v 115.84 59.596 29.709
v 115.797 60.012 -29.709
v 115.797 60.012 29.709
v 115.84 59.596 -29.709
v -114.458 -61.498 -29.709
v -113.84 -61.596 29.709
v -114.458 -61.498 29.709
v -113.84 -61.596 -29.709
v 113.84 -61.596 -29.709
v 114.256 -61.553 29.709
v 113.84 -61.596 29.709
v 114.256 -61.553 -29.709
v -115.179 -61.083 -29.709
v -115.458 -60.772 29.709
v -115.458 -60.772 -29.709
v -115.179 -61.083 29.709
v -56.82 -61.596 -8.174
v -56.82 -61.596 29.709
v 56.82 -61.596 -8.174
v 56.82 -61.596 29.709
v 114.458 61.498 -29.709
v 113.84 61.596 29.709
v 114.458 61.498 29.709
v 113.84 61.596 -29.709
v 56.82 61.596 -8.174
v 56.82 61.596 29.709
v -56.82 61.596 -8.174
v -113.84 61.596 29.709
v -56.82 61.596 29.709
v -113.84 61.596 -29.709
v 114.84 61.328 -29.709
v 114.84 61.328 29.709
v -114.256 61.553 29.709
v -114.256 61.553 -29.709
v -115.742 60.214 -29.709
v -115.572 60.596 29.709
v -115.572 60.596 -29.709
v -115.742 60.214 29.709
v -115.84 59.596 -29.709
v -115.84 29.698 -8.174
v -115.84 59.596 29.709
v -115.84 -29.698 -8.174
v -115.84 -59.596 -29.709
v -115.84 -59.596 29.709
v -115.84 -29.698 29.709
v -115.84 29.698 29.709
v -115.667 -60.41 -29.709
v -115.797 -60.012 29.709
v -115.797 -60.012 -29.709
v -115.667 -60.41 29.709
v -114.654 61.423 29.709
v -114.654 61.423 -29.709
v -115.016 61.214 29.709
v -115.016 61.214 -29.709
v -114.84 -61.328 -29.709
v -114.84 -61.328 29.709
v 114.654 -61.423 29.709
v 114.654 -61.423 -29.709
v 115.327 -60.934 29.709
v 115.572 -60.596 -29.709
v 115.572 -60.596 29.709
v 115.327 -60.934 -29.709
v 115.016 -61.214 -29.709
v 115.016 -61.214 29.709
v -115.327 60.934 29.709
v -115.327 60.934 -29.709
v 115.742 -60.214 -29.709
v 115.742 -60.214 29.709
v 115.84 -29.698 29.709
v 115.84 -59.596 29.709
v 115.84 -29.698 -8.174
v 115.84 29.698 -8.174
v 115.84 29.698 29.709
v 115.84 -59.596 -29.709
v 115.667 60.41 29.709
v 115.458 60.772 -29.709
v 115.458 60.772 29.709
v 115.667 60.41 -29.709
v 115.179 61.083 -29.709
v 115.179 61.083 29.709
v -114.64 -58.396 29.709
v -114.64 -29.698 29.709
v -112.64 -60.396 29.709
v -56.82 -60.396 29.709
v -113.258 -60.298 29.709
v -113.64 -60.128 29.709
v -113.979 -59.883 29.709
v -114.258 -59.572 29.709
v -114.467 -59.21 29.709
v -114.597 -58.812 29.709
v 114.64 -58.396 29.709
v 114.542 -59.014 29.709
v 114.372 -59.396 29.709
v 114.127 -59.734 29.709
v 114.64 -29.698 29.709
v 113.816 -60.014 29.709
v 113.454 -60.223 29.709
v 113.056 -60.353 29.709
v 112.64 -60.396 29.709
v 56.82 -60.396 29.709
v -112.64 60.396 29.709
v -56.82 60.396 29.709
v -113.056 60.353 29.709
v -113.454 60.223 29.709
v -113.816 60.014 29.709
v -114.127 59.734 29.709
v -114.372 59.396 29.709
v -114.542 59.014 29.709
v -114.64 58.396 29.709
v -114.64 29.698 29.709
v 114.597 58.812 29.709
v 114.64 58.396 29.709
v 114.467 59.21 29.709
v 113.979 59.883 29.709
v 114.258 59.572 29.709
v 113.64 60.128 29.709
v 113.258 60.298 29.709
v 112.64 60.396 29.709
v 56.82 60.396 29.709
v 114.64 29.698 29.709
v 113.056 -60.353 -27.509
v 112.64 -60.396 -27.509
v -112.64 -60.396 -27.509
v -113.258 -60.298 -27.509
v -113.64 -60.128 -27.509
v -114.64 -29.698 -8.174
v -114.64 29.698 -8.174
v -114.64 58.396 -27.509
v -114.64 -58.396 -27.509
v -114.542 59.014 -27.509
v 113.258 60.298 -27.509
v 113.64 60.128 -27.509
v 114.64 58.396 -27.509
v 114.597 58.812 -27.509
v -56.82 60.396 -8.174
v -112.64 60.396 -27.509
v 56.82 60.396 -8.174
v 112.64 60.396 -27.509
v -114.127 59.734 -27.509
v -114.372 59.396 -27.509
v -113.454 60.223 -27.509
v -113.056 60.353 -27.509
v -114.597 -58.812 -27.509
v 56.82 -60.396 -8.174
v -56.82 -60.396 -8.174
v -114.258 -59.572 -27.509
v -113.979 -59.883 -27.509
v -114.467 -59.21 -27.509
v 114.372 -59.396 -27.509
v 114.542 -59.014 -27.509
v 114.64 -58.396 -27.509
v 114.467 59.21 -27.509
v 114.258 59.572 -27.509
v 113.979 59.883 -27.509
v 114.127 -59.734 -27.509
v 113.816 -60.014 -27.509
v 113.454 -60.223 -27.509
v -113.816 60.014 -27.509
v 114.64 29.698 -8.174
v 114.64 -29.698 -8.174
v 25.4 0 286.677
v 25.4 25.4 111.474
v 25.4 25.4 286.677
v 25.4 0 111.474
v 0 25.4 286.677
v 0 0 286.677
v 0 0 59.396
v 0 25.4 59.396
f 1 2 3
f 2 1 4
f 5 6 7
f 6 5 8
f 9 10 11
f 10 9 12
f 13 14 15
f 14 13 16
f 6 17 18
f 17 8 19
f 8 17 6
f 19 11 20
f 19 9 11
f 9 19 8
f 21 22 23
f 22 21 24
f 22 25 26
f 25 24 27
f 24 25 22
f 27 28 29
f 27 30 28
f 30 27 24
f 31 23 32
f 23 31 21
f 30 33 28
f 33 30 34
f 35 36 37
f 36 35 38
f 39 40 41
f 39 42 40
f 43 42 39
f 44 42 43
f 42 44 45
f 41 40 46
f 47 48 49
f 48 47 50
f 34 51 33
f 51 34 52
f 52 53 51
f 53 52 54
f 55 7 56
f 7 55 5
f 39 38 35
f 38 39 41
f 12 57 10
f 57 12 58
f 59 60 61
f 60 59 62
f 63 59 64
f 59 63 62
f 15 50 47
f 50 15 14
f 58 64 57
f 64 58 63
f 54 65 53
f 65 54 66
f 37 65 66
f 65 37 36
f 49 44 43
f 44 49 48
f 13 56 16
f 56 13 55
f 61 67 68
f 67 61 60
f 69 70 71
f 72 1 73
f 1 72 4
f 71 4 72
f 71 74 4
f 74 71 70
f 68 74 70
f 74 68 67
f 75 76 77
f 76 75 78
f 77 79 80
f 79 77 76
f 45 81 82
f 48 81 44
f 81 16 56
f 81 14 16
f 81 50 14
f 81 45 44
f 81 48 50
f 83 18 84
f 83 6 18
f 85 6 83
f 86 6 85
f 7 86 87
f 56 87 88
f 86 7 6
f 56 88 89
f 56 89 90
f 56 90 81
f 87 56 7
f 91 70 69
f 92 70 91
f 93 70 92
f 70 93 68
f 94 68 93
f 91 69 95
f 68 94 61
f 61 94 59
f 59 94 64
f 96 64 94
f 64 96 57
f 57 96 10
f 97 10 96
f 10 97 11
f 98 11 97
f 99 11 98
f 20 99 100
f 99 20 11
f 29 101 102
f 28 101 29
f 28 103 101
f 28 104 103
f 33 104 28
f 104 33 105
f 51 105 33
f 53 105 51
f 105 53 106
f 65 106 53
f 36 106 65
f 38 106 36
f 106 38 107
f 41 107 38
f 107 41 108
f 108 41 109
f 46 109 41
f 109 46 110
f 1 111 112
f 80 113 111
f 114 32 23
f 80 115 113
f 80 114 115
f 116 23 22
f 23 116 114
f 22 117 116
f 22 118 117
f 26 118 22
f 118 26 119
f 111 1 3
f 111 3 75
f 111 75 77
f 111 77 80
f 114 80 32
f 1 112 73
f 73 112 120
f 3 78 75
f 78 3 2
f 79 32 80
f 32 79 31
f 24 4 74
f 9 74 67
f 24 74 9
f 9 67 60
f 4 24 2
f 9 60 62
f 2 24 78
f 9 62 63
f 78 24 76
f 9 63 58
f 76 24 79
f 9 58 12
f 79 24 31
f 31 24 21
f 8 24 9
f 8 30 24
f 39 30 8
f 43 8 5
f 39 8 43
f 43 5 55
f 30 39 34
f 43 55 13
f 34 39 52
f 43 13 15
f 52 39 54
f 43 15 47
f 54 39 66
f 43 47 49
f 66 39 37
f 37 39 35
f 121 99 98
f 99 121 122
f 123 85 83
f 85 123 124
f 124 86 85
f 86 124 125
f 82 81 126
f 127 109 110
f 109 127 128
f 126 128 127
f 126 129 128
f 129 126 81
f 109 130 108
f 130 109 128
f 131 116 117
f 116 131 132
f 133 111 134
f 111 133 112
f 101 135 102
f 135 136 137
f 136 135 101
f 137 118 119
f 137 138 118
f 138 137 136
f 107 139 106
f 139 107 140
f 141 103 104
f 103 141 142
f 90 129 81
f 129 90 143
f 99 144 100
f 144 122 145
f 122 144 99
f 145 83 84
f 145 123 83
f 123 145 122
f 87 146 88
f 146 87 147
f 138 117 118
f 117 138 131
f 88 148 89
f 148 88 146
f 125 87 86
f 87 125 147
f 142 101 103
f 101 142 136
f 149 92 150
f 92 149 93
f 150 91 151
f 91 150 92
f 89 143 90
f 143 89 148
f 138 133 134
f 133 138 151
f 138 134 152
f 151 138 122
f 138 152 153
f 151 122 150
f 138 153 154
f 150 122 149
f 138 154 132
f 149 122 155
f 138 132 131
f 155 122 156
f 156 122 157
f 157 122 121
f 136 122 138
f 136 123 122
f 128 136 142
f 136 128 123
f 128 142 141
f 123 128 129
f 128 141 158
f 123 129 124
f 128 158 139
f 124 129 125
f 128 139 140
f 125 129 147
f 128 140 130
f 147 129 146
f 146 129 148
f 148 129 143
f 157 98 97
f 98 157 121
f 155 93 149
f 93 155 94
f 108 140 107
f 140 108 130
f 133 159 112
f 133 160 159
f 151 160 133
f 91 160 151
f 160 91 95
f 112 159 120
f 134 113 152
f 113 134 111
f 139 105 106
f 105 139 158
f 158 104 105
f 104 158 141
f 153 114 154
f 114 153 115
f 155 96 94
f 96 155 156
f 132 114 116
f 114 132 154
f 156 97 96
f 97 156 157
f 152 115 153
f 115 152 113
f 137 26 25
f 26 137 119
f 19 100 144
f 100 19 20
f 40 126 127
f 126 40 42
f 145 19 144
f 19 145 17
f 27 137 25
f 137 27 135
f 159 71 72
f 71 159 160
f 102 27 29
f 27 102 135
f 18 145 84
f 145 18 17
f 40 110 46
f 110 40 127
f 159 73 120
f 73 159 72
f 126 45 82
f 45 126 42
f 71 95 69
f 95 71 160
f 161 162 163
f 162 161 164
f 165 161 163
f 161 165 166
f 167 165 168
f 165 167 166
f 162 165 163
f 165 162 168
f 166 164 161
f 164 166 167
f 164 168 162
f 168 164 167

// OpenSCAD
// file: myTools.scad
module tube (r = 0, d = 0, l = 0, 
            thick = 0, 
            bCentered = true, 
            taper_pct = 0, 
            circlip = false) // r=radius d=dia l=length 
{
    assert( r != 0 || d != 0, "specify one of radius or diameter");
    assert( l != 0 , "tube: need length 'l' to be non zero");
    assert( thick != 0, "wall thickness cannot be zero");

    punch = $preview ? .2 : 0; // stop funny view artifact

    dia = r ? r * 2 : d;

    od = ((thick > 0) ? dia + thick * 2 : dia);
    id = (thick > 0) ? dia             : dia  + thick *2; 

    
    
    if (thick > 0)
        echo ("tube\tMIN id = ", id, "od = ", od, "wall = ", thick, "center= ", bCentered);
    else
        echo ("tube\tMAX od = ", od, "id = ", id, "wall = ", thick, "center= ", bCentered);

    echo ("tube\tHeigth = ", l);
        
    if (taper_pct != 0)
    {
        echo ("tube\t*** OD expanded by ", taper_pct, "%, : bottom od = ", od * (1. +taper_pct/100), "top od = ", od);
    }
    
    assert(dia || dia < 0, "tube : missing r or d ");
    
    // if taper_pct specified, the base will always be closest to 0,0,0
    translate([ 0, 0, taper_pct == 0 ? 0: bCentered ? l/2:l  ])
    rotate([0, taper_pct == 0 ? 0 : 180, 0 ])

    difference()
    {
        // make a reese's cup
        {
            color("YELLOW", .3)
            linear_extrude(height= l, scale = 1 + taper_pct/100)
                difference()
                {
                    circle(d = od);
                    circle(d = .5);
                }
        }
    
     // hollow out reessed cup
     color("GREEN")
     translate([0, 0, -punch/2])
     linear_extrude(height= l+ punch*2, $fn=100)
     {
        circle(d = id);
        if (circlip) #square([1 + punch, od ]);
     }
    
    }
}
//==============================================================================
        
module abox (dims, 
            thick = 0, 
            bCentered = true, 
            round_out = 0, 
            round_in = 0, 
            bSolid = false,
            bHollow = false,
            elevator = 0)   // move bottom up by X
{
    punch = $preview ? .1 : 0; // stop funny view artifact
    
    assert(thick != 0, "Thick must be specified. +=outside dim, -= inside dims");
    assert(dims.z > thick, "wall thickness too large for depth of box");

    wall2 = abs(thick) * 2; // 2 walls in each direction
    wall = wall2 / 2;
    
    // box either grows inward (thick < 0) or outward (thick > 0)  from dims
    fat = dims + [ wall2, wall2, wall];
    thin = dims - [ wall2, wall2, wall];
    
    offset = (thick > 0 && bCentered == false) ? wall : 0;
    
    //echo ("abox : adjusting x,y,z by ", offset, " to move origin from  center to 0,0,0");
    translate( [ bCentered ? 0 : dims.x /2 + offset, bCentered ? 0 : dims.y /2 + offset, bCentered ? 0 : dims.z /2 + offset/2]) 
    {
        if (thick > 0)
        {   
            // wall grows outwards from users dim
            echo ("making a box, MAX INSIDE dim = ", dims, "a wall=", thick, "mm ... max outside = ", fat, " mm");
        }
        else
        {
            // wall grows inward from users dime
            echo ("making a box, MAX OUTSIDE dim = ", dims, "a wall=", thick, "mm ... min inside = ", thin, " mm");
        }
        
        // linear extrude alway works in the positive x/y plane an goes upward.
        // after calc, re-center about 0,0,0 where a bCentered cube would be
        
        translate([ 0, 0, thick > 0  ? -fat.z/2 : -dims.z/2 ])
        difference()
        {
            echo ("round_out = ", round_out);

            // MAKE SOLID BOX --------------------------------------
            router_outside = round_out ? round_out : 0;
            x = thick > 0  ? fat.x - router_outside : dims.x - router_outside;
            y = thick > 0  ? fat.y - router_outside : dims.y - router_outside;


            // MAKE PUCHNED INSIDE
            // using 'offset' it will add r on all dimensions, then round., 
            // so now you have fatter perimeter than you started with :(
            //  but at least the corners are round.
            
            // Compensate by shrinking dimension by r, 
            // and then by calling offset, offset will then add it back

            color("YELLOW", .2)

            linear_extrude(thick > 0  ? fat.z : dims.z)
            if (round_out)
            {
                offset( r= round_out, $fn=30)
                square( [x - router_outside, y - router_outside], true);
            }
            else square( [x - router_outside, y - router_outside], true);
           
            // time to punch out the inside if requested.
            if (bSolid == false)
            {
                hollow_offset = bHollow ? fat.z/2 + .2  : dims.z/2 +.2;
                // punching out inside. its either dims or thin.
                router_inside = round_in;
                echo ("round_in = ", router_inside);
                xi = thick > 0  ? dims.x  : thin.x;
                yi = thick > 0  ? dims.y : thin.y ;

                color("GREEN")

                // move 'punch' up if you need a bottom else zero (hollowed out)

                translate([ 0,0, bHollow ? -.1 : wall + elevator]) 
                linear_extrude(thick > 0  ? fat.z - wall  + hollow_offset : dims.z - wall + hollow_offset)
                //#linear_extrude(fat.z - wall  + hollow_offset)
                
                if (round_in) 
                {
                    offset( r= round_in, $fn=30)
                    square( [ xi - router_inside, yi - router_inside], true);
                }
                else
                    square( [ xi, yi], true);
            }
        }
    }
 }


// 50x25x10 box walls grow inward (-2). on center origin midpoint
// rounded outside (default), sharp corner inside(default), bCentered about 0,0,0
//color("GREEN", .9)
//abox([50,25, 10], -2, true); 


// 50x25x10 box walls grow inward (-2). on center origin midpoint
// sharp outside corners, rounded inside corners. Sit on x,y plane
color("BLUE", .9)
abox([50,20, 10], +2, round_in=2, bCentered = false);  // 50x25x10 box inside dim origin has 0,0


// 50x25x10 box walls grow inward (-2). on center origin midpoint
// sharp corners inside and out. sits on x,y plane
color("GREY", .9)//
translate([ 55, 0, 0])      
abox([50,20, 10], +2, round_out=3, false);

color("PINK", .9)//
translate([ 115, 10, 10])      
abox([86.66, 56.865, 5], -5, bHollow = true, bCentered = false); 

color("GREEN", .9)//
translate([ 140, 10, -10])      
abox([86.66, 56.865, 5], 3, bHollow = true, bCentered = false); 

/*
// 50x25x10 box walls grow inward (-2). on center origin midpoint
// round corners outside and SOLID
color("BLUE", .9)//
translate([ 55, 0, 0])      
abox([50,25, 10], +2, round_out=2, round_in=0, false, bSolid = true); // 50x25x10 box outside dim origin is 0,0
*/

//translate ([-30,-30, 0])
{
/*
    // tube outer dia  20, inner dia = (20 - 8)
    color("PINK")
    tube (d = 20, l = 20, thick = -8, bCentered = false);

    // tube, inner dia = (2* 10), outer dia = ((2*10) + 2) 
    color("PURPLE", .3)
    tube (r = 10, l = 20, thick = +2, bCentered= true);
*/
/*
    tube (d = 60, l = 20, thick = -6, bCentered = false);

    translate([0, 0, 50])
    tube (d = 60, l = 20, thick = -6, bCentered = false, taper_pct = 20, circlip = true);
    //color("GREEN")
    //tube (d = 20, l = 20, thick = -2, bCentered = false, taper = 10, circlip = true);
*/

}
// main file
//use <otherPeoplesWork/threads-scad/threads.scad>
use <myTools.scad>

/* [Hidden] */
MM=25.43;

x = (8 + 15/16) * MM; 
y = (4 + 3/4) * MM - 2;
z = (3 + 0 ) * MM;     

$fn=60;   //circle quantize 360/10=36 degrees per side

// container for the KLEENEX
KLEENEX_outside = [ x, y, z * 3/4];

module build_KLEENEX()
{
    difference()
    {
        // container for the KLEENEX
        abox( KLEENEX_outside, thick = +2.2, round_out =2, round_in = 2, bCentered = true);
        translate([0,0, z/7])
        {
            #cube ([ x /2 , y * 2, z/2], true);
            #cube ([ x *2 , y / 2, z/2], true);
        }
        //#cylinder(h = z+1, d = 20);
    }
 }

build_KLEENEX();
 
// make 'stand'
 j = 25.4;
 
translate([0, 0, y/2])
{
    difference()
    {
        cube([ j, j, x]);

        translate( [0, 0, 0])
        rotate([ 0, 26, 0])
        #cube([ j, j, y]);
    }
} 
